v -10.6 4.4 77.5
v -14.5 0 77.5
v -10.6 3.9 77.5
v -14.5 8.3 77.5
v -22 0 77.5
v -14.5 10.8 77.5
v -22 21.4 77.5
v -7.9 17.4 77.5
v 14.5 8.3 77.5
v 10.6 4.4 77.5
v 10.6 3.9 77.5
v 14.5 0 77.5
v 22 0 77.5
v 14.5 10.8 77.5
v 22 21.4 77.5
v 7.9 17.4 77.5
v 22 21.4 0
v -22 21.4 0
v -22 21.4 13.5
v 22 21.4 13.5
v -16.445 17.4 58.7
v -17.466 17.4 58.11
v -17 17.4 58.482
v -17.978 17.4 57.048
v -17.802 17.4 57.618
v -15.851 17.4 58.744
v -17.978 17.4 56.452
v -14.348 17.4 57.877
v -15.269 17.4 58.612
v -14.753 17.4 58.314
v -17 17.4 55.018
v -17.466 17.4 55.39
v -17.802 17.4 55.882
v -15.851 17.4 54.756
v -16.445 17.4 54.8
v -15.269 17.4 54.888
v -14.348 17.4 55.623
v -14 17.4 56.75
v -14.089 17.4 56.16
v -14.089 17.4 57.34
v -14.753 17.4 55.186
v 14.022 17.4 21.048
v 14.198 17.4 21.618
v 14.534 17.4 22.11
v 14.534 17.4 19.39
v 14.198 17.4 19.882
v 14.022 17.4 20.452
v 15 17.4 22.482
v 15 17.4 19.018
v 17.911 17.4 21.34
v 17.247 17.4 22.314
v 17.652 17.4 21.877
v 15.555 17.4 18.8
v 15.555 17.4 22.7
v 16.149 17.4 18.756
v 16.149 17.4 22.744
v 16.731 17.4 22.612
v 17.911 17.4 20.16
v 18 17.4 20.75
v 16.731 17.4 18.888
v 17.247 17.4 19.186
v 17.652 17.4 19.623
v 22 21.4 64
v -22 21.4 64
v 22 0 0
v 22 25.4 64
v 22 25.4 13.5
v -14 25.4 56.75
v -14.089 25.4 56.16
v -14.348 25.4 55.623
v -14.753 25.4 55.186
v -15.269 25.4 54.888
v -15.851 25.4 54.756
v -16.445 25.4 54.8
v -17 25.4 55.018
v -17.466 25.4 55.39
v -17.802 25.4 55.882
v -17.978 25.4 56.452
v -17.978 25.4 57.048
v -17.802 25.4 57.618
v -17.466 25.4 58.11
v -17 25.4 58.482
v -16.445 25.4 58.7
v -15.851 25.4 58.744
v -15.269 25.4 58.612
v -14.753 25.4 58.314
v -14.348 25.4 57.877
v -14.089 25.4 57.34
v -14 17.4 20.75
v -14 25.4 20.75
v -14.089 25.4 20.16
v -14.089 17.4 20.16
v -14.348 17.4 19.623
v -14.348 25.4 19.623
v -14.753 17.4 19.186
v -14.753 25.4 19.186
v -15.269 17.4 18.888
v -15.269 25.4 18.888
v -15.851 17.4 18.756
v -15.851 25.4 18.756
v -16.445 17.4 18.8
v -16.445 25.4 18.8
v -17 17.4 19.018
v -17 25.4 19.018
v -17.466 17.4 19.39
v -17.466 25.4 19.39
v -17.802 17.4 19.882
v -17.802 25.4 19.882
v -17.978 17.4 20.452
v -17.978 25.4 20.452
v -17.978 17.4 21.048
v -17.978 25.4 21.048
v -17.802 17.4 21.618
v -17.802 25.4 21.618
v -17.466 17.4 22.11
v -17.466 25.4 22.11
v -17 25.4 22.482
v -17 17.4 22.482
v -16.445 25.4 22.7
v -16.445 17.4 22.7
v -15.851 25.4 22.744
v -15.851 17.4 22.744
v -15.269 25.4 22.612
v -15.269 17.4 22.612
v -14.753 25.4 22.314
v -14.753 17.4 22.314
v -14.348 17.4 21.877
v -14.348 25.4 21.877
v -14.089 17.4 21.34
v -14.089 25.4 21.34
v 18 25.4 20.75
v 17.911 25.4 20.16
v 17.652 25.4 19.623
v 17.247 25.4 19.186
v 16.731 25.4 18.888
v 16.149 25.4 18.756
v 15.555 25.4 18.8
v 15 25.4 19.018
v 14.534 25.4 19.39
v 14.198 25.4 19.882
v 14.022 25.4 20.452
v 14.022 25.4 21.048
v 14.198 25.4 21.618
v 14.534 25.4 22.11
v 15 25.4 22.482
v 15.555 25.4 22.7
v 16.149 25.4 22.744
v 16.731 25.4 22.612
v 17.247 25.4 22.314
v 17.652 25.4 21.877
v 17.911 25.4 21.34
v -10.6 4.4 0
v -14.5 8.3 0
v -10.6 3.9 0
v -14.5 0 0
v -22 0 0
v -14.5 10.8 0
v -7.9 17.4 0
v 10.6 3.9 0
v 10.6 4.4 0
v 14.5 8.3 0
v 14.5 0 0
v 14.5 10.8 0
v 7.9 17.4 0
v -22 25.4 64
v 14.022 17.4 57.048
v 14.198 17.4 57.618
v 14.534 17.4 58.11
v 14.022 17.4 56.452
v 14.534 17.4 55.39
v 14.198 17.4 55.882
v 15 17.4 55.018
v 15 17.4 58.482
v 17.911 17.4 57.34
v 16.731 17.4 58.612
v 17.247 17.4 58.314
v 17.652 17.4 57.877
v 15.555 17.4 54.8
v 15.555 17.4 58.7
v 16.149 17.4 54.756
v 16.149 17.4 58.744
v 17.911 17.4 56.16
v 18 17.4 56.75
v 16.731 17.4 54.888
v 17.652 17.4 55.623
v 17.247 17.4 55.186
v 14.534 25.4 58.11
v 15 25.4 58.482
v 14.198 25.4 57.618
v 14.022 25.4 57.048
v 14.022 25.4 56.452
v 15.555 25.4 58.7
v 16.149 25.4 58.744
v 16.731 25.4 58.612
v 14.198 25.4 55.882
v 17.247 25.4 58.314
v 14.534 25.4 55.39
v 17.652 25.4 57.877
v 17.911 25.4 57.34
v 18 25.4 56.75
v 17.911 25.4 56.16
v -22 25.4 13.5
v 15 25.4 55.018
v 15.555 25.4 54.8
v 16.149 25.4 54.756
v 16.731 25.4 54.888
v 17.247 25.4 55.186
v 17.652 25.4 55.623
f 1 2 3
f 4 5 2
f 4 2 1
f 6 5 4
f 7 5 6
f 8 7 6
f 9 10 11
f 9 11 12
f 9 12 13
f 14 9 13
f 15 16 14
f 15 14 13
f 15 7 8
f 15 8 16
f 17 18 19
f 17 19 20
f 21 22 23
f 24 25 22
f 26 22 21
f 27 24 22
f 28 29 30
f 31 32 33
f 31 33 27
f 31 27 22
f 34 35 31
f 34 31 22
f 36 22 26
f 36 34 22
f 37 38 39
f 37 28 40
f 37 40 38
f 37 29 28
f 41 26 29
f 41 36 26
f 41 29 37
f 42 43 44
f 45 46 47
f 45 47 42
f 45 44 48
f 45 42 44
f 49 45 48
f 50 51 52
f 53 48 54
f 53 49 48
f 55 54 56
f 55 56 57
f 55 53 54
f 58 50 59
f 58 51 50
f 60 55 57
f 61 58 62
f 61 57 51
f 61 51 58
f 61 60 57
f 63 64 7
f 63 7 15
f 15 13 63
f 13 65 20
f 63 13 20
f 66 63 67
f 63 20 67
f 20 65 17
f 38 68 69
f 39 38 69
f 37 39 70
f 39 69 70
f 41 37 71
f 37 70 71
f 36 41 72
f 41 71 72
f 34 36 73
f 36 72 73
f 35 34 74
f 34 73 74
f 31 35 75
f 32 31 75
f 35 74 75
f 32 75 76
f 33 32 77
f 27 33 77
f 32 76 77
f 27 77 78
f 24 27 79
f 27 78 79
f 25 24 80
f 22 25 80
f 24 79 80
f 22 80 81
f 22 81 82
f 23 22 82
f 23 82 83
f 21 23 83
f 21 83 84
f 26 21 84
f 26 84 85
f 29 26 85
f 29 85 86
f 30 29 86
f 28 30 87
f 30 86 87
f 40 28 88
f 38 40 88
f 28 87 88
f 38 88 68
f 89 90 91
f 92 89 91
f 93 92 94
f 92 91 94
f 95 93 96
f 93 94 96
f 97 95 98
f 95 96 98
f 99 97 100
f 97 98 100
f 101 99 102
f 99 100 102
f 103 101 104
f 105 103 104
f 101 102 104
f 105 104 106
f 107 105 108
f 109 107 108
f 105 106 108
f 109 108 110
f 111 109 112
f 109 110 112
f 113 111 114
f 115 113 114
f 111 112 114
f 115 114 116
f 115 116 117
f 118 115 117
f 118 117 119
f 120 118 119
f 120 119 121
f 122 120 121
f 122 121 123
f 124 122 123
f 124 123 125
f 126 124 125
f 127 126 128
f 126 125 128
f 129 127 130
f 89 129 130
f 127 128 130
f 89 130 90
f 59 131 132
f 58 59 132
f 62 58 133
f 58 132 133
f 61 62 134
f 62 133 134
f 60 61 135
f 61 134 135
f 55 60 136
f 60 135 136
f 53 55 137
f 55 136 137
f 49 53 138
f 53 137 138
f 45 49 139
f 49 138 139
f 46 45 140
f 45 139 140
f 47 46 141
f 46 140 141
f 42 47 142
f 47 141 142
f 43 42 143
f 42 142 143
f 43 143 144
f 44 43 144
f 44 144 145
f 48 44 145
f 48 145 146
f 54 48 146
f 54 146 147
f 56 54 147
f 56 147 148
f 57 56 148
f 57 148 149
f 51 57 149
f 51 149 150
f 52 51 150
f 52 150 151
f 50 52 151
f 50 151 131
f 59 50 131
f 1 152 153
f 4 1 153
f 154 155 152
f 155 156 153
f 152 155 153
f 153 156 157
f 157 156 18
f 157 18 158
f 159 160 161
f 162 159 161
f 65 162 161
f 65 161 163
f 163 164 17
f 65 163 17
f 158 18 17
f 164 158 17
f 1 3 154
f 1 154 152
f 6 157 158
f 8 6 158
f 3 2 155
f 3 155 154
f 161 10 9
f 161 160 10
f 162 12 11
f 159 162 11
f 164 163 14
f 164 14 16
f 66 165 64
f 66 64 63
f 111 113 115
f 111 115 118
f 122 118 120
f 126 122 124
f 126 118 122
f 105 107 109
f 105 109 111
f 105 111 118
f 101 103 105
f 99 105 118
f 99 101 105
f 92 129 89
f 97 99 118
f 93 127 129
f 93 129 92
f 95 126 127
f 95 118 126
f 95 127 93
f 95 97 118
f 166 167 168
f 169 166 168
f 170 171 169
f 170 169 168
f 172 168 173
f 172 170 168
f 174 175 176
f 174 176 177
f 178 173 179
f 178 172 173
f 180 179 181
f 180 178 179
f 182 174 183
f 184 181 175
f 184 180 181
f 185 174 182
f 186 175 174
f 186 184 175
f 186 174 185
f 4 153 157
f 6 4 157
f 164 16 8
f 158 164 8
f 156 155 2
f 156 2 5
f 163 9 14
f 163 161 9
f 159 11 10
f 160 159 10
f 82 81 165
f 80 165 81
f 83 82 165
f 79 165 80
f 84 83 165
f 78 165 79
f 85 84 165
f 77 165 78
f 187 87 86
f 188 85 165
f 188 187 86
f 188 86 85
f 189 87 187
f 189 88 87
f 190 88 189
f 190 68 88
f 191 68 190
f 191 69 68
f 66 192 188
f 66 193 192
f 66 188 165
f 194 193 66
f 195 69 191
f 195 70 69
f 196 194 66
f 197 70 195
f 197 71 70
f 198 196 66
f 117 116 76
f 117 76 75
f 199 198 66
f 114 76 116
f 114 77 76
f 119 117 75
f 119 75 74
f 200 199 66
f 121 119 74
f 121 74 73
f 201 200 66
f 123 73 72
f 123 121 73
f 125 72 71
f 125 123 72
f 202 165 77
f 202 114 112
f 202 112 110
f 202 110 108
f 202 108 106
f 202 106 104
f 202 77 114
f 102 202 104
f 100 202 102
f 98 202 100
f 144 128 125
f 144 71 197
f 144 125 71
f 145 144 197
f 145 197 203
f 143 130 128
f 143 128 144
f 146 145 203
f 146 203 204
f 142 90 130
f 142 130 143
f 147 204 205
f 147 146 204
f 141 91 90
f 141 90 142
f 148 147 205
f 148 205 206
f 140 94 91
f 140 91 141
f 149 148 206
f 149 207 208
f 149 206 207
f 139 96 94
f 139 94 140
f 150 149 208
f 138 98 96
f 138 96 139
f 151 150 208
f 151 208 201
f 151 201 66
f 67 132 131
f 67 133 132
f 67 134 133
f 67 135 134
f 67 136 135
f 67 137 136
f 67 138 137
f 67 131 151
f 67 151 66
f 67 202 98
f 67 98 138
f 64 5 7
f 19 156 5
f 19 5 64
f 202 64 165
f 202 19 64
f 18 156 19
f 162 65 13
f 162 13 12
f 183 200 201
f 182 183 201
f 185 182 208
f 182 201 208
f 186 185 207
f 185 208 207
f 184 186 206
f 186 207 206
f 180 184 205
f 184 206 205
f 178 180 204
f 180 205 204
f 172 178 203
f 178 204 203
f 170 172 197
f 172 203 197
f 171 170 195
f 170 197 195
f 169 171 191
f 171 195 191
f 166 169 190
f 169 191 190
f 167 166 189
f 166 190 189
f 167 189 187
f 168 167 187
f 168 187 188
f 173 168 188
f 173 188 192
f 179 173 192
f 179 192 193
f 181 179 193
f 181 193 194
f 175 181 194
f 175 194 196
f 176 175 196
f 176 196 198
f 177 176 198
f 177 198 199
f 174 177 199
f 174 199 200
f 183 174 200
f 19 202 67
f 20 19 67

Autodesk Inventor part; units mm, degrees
ref_plane "YZ Plane" through (0, 0, 0) normal (1, 0, 0) x (0, 1, 0)
ref_plane "XZ Plane" through (0, 0, 0) normal (0, 1, 0) x (-1, 0, 0)
ref_plane "XY Plane" through (0, 0, 0) normal (0, 0, 1) x (1, 0, 0)
sketch "Sketch1" plane through (0, 0, 0) normal (0, 0, 1) x (1, 0, 0)
  line L0 (0, 0) -> (-22, 0)
  line L1 (-22, 0) -> (-22, 0)
  line L2 (-22, 0) -> (-14.5, 0)
  line L3 (-22, 0) -> (-22, 25.4)
  line L4 (-22, 25.4) -> (0, 25.4)
  line L5 (-29.0722, -4.6) -> (-18.7593, -4.6) construction
  line L6 (-22, 0) -> (0, 0) construction
  line L7 (0, 0) -> (22, 0) construction
  line L8 (0, -10.6) -> (0, 31.4) construction
  line L9 (0, -4.6) -> (0, 12.9) construction
  line L10 (0, -4.6) -> (-10, -4.6) construction
  line L11 (0, -4.6) -> (10, -4.6) construction
  line L12 (-10, -4.6) -> (-10, 0) construction
  line L13 (-10, 0) -> (-6.1, 3.9) construction
  line L14 (-6.1, 3.9) -> (-6.1, 4.4) construction
  line L15 (-6.1, 4.4) -> (-10, 8.3) construction
  line L16 (-10, 8.3) -> (-10, 10.8) construction
  line L17 (-10, 10.8) -> (-7.9, 12.9) construction
  line L18 (-7.9, 12.9) -> (0, 12.9) construction
  line L19 (10, 0) -> (6.1, 3.9) construction
  line L20 (6.1, 3.9) -> (6.1, 4.4) construction
  line L21 (6.1, 4.4) -> (10, 8.3) construction
  line L22 (10, 8.3) -> (10, 10.8) construction
  line L23 (10, 10.8) -> (7.9, 12.9) construction
  line L24 (10, -4.6) -> (10, 0) construction
  line L25 (7.9, 12.9) -> (0, 12.9) construction
  line L26 (-14.5, 8.3) -> (-14.5, 10.8)
  line L27 (-14.5, 10.8) -> (-7.9, 17.4)
  line L28 (-7.9, 17.4) -> (0, 17.4)
  line L29 (-14.5, 0) -> (-10.6, 3.9)
  line L30 (-10.6, 3.9) -> (-10.6, 4.4)
  line L31 (-10.6, 4.4) -> (-14.5, 8.3)
  line L32 (-10.6, 3.9) -> (-6.1, 3.9) construction
  line L33 (-10, 8.3) -> (-14.5, 8.3) construction
  line L34 (22, 0) -> (14.5, 0)
  line L35 (22, 0) -> (22, 25.4)
  line L36 (22, 25.4) -> (0, 25.4)
  line L37 (14.5, 8.3) -> (14.5, 10.8)
  line L38 (14.5, 10.8) -> (7.9, 17.4)
  line L39 (7.9, 17.4) -> (0, 17.4)
  line L40 (14.5, 0) -> (10.6, 3.9)
  line L41 (10.6, 3.9) -> (10.6, 4.4)
  line L42 (10.6, 4.4) -> (14.5, 8.3)
  point P0 (-3.95, 17.4)
  dimension "d0" = 4.6
  dimension "d1" = 44
  dimension "d3" = 17.5
  dimension "d4" = 20
  dimension "d5" = 4.6
  dimension "d6" = 8.5
  dimension "d7" = 135
  dimension "d8" = 0.5
  dimension "d9" = 135
  dimension "d10" = 2.5
  dimension "d11" = 7.5
  dimension "d12" = 25.4
  dimension "d13" = 45
  dimension "d14" = 135
  dimension "d15" = 2.5
  dimension "d16" = 0.5
  dimension "d17" = 135
  dimension "d19" = 4.5
extrude "Extrusion1" add sketch "Sketch1" along normal blind 77.5
sketch "Sketch2" plane through (-22, 25.4, 0) normal (0, 1, 0) x (1, 0, 0)
  circle A0 centre (6, -20.75) radius 2
  circle A1 centre (6, -56.75) radius 2
  line L0 (6, -20.75) -> (6, -56.75)
  circle A2 centre (38, -20.75) radius 2
  circle A3 centre (38, -56.75) radius 2
  line L1 (38, -20.75) -> (38, -56.75) construction
  line L2 (22, 0) -> (22, -77.5) construction
  line L3 (44, -77.5) -> (0, -77.5) construction
  line L4 (38, -38.75) -> (22, -38.75) construction
  line L5 (6, -38.75) -> (22, -38.75) construction
  line L6 (0, 0) -> (0, -77.5) construction
  line L7 (44, -64) -> (0, -64) construction
  line L8 (0, -64) -> (0, -13.5) construction
  line L9 (0, -13.5) -> (44, -13.5) construction
  line L10 (44, -13.5) -> (44, -64) construction
  line L11 (44, -64) -> (0, -13.5) construction
  line L12 (0, -64) -> (44, -13.5) construction
  line L13 (44, 0) -> (44, -77.5) projected
  line L14 (0, -13.5) -> (44, -13.5)
  line L15 (44, -13.5) -> (44, 0)
  line L16 (44, 0) -> (0, 0)
  line L17 (0, 0) -> (0, -13.5)
  line L18 (0, -64) -> (44, -64)
  line L19 (44, -64) -> (44, -77.5)
  line L20 (44, -77.5) -> (0, -77.5)
  line L21 (0, -77.5) -> (0, -64)
  point P0 (7.5, -77.5)
  dimension "d22" = 36
  dimension "d23" = 4
  dimension "d24" = 4
  dimension "d25" = 36
  dimension "d26" = 4
  dimension "d27" = 4
  dimension "d29" = 32
  dimension "d30" = 50.5
extrude "Extrusion2" cut sketch "Sketch2" against normal blind 8 contours A0 | A1 | A2 | A3
extrude "Extrusion3" cut sketch "Sketch2" against normal blind 4 contours L13 L20 L21 L18 | L13 L14 L17 L16
equation "\"d15\" = d10"
equation "\"d16\" = d8"
properties part number "HGH20CA Slider Block"
